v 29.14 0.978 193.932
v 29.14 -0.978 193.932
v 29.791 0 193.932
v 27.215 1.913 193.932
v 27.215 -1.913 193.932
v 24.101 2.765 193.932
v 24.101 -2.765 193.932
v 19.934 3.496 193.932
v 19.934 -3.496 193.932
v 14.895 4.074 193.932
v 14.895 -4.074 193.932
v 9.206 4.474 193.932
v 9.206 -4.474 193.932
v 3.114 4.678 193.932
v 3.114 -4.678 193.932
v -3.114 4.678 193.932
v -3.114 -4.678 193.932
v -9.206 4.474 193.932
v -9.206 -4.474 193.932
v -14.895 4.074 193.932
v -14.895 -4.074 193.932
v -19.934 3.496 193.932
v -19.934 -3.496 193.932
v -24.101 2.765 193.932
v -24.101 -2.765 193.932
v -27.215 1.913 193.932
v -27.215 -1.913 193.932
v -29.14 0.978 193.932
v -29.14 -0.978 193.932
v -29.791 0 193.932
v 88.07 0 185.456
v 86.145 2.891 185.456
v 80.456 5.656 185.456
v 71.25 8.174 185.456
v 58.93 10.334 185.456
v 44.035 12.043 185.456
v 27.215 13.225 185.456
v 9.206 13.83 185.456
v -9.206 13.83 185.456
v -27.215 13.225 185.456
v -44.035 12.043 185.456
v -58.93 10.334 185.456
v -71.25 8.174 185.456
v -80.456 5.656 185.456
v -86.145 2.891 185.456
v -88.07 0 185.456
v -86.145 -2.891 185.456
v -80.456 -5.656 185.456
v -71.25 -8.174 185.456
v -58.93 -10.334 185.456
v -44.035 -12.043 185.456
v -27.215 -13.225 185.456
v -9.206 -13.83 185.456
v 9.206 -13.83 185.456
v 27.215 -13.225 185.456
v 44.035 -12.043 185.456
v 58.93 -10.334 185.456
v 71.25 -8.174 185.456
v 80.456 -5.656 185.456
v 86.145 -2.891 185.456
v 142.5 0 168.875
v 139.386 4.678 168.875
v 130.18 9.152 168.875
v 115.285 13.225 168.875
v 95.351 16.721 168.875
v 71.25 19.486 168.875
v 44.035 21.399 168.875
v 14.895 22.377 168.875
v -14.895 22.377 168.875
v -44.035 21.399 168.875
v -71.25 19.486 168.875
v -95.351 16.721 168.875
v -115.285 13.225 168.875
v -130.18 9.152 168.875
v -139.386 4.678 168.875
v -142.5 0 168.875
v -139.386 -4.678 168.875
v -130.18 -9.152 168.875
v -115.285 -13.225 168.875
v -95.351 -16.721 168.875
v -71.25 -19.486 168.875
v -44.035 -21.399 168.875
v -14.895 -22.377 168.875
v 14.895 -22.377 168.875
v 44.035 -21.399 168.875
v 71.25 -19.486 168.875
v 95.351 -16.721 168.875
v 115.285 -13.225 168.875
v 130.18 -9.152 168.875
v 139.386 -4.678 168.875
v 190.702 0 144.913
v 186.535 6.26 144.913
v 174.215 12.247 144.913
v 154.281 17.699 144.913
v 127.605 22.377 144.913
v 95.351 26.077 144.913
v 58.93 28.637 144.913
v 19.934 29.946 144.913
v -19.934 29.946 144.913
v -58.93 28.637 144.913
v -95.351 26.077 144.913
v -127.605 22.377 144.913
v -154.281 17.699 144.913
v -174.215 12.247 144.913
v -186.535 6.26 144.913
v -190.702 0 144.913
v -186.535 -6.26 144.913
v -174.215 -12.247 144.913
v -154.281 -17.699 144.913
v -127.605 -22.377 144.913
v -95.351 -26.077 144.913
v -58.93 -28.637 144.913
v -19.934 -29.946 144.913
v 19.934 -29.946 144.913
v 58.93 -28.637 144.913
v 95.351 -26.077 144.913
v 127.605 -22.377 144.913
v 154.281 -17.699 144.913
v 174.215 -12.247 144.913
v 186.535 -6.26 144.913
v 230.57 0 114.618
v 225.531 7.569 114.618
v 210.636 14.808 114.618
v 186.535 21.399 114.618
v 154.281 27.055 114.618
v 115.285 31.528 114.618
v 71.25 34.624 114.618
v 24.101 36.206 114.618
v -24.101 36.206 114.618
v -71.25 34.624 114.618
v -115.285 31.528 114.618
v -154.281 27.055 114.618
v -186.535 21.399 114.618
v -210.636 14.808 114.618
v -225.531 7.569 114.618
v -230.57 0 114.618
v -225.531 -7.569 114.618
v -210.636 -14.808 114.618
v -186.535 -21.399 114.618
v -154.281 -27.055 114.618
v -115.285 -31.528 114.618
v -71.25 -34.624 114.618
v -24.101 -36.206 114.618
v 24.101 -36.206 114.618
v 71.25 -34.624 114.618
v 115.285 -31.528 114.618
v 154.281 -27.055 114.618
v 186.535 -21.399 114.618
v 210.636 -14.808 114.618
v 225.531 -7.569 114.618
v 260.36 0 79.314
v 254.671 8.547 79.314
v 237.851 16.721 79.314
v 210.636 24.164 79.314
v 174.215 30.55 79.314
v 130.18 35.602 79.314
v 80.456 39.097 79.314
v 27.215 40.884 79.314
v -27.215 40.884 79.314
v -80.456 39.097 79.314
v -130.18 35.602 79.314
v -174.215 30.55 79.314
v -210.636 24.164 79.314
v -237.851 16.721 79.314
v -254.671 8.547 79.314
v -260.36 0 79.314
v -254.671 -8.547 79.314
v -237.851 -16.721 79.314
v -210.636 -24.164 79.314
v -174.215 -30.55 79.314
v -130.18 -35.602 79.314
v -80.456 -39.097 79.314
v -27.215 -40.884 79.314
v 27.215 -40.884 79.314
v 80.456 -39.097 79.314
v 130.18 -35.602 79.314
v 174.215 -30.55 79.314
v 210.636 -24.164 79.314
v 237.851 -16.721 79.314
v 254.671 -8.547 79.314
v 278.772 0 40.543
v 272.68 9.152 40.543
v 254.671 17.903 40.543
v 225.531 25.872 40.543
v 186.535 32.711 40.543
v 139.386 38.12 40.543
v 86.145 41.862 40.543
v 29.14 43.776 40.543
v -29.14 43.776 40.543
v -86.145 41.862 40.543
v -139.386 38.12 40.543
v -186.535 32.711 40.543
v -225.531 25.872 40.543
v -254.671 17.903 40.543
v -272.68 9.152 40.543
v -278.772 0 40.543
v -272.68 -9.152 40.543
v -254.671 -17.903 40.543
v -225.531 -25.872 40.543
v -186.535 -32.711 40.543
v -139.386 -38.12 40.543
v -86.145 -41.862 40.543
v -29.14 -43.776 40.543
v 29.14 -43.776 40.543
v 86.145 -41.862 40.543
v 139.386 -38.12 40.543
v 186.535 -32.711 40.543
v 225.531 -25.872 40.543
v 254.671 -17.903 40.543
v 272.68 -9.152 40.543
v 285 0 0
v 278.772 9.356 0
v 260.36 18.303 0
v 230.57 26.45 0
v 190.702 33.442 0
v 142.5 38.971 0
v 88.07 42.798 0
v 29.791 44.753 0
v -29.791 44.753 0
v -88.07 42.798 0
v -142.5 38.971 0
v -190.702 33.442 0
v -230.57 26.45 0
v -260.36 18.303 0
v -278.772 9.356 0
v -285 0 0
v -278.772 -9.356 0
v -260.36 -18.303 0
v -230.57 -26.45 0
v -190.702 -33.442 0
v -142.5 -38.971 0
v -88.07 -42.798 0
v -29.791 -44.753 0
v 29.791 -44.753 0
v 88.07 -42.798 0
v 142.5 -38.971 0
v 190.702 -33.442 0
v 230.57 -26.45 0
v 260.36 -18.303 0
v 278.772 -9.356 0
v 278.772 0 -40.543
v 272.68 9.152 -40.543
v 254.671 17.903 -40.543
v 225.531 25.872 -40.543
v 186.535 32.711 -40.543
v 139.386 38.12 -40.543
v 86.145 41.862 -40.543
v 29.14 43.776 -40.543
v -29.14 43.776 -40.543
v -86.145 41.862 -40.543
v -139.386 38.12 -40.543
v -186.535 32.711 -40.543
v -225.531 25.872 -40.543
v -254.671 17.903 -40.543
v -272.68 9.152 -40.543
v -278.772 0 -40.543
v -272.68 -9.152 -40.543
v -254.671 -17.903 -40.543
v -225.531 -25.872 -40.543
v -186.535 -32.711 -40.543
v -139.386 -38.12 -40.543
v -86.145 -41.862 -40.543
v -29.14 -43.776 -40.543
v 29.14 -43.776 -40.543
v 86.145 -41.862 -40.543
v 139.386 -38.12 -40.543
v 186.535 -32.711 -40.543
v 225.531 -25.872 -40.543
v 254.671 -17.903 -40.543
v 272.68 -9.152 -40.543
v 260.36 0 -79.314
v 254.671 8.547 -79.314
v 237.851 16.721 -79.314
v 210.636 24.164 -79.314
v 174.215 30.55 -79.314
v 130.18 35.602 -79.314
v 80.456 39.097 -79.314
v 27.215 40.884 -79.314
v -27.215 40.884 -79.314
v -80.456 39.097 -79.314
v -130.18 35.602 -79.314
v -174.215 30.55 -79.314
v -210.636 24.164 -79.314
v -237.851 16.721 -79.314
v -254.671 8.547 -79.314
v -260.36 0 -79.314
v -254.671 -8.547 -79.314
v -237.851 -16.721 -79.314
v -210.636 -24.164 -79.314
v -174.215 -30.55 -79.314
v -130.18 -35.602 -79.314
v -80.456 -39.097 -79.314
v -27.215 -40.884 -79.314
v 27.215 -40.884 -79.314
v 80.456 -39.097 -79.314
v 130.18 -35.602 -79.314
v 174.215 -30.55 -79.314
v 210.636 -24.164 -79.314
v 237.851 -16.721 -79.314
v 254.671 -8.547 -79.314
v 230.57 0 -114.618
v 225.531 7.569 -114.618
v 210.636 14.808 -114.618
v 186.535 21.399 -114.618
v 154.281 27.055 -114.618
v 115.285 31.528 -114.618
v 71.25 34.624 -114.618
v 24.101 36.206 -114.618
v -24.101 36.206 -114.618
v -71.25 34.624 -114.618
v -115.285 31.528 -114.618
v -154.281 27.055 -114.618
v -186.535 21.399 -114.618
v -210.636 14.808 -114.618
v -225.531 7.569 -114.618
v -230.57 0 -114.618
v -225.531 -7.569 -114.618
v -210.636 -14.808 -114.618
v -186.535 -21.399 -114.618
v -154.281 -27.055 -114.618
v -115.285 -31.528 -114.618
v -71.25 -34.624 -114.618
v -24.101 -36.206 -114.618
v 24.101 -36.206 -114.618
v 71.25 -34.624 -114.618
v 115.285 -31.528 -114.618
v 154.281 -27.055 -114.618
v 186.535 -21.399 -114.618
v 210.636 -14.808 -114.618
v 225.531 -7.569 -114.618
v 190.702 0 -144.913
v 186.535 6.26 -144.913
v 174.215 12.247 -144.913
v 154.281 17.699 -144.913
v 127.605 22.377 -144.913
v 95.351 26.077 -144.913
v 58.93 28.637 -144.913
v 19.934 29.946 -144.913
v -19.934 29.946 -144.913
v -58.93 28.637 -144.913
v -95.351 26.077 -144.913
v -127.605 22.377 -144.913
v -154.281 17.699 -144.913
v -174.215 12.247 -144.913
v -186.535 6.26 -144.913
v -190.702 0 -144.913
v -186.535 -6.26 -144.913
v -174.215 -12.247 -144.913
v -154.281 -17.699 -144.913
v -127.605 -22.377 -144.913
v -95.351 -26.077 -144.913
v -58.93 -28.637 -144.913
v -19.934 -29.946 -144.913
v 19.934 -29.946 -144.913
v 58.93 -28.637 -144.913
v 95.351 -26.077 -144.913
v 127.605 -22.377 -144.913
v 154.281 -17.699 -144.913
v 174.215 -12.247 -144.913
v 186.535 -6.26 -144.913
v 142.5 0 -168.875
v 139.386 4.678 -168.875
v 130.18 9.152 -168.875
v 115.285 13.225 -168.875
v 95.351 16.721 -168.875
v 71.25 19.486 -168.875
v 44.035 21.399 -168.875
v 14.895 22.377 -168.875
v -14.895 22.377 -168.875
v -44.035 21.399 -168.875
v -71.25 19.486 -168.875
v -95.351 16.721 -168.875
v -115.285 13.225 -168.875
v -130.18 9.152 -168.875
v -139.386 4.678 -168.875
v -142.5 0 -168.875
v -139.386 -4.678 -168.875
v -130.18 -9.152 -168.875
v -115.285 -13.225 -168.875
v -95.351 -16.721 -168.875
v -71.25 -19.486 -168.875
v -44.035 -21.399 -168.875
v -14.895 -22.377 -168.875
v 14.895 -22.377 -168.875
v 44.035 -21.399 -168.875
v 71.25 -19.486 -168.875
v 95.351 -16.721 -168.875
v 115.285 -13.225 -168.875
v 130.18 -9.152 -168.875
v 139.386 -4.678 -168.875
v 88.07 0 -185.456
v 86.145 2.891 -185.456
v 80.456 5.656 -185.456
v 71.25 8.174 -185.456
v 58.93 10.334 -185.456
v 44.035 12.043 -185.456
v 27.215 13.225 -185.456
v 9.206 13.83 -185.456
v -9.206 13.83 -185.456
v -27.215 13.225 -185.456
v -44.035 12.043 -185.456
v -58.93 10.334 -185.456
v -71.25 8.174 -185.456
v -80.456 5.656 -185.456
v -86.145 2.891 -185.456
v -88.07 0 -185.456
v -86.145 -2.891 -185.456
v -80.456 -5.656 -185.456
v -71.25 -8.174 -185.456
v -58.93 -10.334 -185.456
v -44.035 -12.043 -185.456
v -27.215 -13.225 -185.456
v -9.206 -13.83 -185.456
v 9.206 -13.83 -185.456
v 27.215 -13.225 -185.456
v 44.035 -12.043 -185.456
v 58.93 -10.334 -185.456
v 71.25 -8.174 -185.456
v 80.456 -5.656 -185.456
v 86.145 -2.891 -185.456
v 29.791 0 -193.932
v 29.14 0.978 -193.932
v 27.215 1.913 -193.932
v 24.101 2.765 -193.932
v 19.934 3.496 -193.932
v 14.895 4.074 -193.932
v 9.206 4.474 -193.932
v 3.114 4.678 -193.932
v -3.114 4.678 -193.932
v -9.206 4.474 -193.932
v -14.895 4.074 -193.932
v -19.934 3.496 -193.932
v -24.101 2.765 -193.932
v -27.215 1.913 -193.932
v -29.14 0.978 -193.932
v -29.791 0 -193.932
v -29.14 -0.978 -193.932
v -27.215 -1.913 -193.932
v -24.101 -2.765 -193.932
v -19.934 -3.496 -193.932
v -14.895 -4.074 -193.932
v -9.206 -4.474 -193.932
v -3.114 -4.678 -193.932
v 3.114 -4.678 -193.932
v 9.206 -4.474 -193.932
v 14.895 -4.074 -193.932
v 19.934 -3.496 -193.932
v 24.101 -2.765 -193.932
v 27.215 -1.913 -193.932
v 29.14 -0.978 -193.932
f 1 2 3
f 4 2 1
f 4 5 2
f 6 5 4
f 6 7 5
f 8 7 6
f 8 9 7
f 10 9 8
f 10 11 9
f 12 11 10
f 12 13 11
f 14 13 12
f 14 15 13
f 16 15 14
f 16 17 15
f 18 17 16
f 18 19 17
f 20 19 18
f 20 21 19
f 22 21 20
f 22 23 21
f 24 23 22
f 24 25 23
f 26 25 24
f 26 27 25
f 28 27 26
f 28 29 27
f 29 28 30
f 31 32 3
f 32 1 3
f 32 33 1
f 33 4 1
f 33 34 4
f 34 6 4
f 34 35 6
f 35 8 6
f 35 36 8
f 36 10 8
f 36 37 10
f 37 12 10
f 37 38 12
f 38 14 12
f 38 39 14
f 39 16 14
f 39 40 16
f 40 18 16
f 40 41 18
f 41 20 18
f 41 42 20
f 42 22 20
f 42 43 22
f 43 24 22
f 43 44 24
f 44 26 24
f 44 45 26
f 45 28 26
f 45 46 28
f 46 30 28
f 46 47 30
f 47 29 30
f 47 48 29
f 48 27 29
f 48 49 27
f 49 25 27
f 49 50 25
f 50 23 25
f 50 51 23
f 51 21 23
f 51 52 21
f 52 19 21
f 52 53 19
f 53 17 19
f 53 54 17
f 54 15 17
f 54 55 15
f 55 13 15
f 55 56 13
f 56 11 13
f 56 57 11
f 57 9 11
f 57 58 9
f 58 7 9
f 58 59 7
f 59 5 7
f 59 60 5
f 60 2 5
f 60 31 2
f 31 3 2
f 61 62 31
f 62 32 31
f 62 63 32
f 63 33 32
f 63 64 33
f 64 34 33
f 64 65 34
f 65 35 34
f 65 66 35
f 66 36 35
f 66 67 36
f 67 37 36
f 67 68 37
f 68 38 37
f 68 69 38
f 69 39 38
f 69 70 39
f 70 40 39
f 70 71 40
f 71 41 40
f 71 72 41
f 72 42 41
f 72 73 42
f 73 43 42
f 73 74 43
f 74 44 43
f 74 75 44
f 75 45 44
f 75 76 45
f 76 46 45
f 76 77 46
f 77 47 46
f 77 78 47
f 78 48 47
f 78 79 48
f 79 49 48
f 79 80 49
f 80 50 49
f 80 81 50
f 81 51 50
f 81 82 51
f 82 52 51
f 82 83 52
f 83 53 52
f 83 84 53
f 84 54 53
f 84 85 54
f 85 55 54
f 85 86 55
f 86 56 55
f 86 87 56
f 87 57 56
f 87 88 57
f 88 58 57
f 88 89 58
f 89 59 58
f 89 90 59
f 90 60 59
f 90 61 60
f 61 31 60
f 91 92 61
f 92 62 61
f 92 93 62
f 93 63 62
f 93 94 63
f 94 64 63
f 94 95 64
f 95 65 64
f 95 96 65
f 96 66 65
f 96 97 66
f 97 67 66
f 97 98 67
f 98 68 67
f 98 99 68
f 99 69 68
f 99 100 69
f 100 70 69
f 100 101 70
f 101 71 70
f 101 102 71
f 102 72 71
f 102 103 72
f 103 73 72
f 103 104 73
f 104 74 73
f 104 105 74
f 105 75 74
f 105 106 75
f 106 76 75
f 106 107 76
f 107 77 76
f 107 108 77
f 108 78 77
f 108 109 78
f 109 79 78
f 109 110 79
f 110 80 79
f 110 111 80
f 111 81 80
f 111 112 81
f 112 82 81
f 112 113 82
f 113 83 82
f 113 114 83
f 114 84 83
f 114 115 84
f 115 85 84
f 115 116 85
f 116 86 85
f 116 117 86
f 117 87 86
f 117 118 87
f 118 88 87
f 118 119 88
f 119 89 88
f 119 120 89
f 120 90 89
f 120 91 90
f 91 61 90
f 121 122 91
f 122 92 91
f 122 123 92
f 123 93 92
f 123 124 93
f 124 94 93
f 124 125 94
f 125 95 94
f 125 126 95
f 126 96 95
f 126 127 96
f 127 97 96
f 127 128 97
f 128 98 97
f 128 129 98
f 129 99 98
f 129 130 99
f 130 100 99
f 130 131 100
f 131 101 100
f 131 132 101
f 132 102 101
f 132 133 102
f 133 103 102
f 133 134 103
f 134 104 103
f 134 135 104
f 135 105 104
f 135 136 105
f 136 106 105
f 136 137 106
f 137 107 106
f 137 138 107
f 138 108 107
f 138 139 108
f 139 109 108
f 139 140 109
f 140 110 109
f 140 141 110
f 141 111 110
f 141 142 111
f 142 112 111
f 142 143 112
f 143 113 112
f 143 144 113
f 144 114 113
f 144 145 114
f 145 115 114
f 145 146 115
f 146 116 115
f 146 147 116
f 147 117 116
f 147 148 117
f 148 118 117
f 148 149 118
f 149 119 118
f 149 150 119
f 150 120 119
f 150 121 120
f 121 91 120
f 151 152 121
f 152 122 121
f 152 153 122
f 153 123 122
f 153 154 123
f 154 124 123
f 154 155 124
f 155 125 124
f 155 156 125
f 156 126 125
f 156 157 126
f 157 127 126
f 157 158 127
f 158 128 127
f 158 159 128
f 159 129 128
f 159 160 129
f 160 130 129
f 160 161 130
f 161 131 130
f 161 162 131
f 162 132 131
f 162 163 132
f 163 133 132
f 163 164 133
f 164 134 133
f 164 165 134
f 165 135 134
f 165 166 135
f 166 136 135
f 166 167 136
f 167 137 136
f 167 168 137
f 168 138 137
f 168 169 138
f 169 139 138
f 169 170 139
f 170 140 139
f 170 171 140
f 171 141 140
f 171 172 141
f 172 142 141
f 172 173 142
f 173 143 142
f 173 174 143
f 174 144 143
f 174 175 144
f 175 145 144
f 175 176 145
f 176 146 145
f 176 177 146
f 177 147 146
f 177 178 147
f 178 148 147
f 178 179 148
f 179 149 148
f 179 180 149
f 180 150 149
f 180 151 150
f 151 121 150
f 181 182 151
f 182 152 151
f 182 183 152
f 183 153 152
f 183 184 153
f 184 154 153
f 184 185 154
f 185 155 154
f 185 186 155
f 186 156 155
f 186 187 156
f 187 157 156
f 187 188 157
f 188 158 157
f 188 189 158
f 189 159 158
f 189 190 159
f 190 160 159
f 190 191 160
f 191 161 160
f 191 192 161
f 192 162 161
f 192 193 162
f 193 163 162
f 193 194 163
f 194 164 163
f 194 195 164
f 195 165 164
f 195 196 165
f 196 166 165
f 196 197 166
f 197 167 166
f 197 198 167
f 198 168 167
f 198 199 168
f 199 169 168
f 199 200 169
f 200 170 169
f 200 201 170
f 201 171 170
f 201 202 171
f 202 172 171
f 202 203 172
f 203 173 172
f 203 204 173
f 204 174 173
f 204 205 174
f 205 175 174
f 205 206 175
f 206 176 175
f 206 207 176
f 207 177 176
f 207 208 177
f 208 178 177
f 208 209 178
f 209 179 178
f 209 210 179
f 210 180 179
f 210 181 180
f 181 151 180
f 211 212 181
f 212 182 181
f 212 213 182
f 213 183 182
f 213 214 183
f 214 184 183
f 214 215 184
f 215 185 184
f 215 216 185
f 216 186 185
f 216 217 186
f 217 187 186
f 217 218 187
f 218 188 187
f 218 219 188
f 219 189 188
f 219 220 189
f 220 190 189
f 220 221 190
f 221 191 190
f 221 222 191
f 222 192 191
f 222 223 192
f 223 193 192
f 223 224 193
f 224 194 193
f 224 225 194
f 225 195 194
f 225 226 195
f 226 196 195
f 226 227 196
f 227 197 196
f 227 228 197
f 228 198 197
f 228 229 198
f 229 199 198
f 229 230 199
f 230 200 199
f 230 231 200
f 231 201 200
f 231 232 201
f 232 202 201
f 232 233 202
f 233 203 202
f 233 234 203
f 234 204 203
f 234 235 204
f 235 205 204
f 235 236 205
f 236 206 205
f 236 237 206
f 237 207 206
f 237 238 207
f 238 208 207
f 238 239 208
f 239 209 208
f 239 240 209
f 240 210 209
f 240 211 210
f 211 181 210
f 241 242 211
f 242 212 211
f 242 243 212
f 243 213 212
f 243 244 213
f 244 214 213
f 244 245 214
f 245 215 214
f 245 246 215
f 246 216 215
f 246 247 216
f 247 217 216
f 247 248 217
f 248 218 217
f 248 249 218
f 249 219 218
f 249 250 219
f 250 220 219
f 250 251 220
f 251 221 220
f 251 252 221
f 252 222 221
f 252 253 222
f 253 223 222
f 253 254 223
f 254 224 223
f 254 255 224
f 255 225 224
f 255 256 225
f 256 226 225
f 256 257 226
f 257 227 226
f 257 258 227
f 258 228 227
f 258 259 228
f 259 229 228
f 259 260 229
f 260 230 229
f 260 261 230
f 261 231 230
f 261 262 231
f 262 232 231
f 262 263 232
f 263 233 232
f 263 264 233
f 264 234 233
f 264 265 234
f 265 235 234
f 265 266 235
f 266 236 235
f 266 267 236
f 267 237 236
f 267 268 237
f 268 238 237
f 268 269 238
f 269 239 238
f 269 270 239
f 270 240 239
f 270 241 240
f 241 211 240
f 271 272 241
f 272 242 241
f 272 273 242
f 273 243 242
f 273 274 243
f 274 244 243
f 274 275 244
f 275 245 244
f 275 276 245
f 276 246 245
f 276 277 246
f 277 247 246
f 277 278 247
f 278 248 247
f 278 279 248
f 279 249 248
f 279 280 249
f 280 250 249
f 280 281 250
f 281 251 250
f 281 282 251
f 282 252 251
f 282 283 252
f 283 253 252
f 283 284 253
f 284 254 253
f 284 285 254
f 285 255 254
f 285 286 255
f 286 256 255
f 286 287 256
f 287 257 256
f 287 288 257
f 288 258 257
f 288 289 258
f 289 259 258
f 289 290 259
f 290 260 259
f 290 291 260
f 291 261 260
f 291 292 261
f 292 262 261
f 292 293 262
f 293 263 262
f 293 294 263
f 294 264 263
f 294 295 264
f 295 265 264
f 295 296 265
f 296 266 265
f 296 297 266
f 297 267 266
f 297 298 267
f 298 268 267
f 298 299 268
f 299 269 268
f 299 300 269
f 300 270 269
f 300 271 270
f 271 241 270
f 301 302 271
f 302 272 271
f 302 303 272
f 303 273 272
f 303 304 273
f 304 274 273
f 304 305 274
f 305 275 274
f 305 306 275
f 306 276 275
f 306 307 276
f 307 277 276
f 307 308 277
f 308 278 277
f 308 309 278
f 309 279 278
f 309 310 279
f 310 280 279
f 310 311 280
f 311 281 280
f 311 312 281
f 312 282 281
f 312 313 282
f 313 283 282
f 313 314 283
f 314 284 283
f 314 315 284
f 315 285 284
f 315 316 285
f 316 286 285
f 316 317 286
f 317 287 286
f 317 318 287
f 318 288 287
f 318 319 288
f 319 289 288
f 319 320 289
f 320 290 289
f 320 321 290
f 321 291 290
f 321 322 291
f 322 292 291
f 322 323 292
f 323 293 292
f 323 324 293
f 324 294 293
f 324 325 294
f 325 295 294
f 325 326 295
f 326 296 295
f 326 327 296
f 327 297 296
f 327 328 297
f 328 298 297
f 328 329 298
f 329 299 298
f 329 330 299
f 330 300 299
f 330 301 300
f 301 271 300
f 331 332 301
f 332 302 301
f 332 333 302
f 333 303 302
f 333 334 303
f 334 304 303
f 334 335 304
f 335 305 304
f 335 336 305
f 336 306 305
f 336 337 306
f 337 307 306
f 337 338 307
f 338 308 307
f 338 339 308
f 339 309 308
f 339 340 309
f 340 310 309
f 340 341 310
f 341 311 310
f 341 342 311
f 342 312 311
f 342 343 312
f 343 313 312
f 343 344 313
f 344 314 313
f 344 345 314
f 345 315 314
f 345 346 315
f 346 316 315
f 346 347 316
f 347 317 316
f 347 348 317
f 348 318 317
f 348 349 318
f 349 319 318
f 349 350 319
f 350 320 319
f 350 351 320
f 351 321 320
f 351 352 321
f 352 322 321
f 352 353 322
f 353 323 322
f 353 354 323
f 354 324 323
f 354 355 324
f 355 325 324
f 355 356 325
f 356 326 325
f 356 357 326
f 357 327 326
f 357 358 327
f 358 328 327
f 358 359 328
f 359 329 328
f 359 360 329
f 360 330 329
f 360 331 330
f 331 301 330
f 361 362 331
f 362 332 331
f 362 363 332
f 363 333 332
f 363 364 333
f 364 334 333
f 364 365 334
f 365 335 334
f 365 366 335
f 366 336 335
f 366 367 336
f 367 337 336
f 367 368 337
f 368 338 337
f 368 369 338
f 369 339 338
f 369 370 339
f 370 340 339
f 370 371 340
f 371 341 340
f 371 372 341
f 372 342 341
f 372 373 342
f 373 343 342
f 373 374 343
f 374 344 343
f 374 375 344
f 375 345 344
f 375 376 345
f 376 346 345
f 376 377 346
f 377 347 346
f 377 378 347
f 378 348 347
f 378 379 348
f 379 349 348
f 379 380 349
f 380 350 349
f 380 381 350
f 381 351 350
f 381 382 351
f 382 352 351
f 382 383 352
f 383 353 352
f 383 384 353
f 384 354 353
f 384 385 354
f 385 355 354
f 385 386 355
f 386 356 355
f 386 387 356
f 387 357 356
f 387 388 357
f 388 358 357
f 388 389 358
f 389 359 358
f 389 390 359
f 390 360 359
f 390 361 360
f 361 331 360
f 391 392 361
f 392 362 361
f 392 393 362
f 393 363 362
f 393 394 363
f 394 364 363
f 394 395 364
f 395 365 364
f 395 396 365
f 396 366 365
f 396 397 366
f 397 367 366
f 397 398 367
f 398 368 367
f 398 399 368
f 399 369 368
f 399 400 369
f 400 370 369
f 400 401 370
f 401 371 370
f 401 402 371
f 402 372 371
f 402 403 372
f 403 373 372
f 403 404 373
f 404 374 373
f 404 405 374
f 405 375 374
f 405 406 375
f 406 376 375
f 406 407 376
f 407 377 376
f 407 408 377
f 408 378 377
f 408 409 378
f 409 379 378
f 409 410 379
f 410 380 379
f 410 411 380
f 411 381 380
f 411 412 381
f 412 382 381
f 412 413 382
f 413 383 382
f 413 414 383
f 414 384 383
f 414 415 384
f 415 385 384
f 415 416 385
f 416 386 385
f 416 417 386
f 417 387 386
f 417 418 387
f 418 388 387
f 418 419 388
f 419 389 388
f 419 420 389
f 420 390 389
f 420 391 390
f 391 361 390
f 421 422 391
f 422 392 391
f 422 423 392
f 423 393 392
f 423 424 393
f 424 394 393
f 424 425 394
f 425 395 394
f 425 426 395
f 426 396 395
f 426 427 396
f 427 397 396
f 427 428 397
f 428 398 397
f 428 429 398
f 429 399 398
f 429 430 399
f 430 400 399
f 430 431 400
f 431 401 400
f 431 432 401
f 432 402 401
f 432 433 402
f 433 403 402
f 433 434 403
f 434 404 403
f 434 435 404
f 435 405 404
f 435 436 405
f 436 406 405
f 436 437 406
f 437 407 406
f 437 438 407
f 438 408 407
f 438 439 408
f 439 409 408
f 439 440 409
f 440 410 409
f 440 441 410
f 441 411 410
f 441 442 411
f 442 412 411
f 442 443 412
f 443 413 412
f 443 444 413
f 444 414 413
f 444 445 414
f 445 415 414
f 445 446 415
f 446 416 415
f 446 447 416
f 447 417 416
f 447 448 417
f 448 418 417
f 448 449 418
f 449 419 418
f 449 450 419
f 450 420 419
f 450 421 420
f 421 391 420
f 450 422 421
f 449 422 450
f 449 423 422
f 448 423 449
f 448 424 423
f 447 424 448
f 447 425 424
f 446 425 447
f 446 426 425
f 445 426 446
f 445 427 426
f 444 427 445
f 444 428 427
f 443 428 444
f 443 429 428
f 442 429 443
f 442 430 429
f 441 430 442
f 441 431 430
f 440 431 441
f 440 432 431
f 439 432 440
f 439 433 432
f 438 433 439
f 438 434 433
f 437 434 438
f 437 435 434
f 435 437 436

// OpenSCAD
// Generated by SolidPython 1.0.1 on 2020-07-29 00:46:53


scale(v = [19, 3, 13]) {
	sphere(r = 15);
}
/***********************************************
*********      SolidPython code:      **********
************************************************
 
# import packages: SolidPython
from solid import *
from solid.utils import *
from itertools import chain, combinations, permutations


class Resize:

    def __init__(self, scad_file):
        self.scad_file = scad_file
        #self.scad_file = import_scad(scad_file)
        # cone/cylinder param:
        self.r1 = 0
        self.r2 = 0
        self.h = 0
        # rectangular prism param:
        self.w = 0
        self.l = 0
        # ellipse param:
        self.r = 0

    # import OpenScad code (file name corresponds to shape)


    # classify shape + parameters
    def assign(self, param1, param2, param3):
        if self.scad_file == 'cone.scad':
            self.r1 = param1
            self.r2 = param2
            self.h = param3
        elif self.scad_file == 'cylinder.scad':
            self.r1 = param1
            self.r2 = param2
            self.h = param3
        elif self.scad_file == 'rectangularPrism.scad':
            self.h = param1
            self.l = param2
            self.w = param3
        else:
            self.r = param1
            self.h = param2

    # resize parameters
    def iterate(self):
        x = range(3, 20, 2)
        i = 1
        if self.scad_file == 'cone.scad':
            tempList = list(permutations(x, 2))
            for temp in tempList:
                param1 = temp[0]
                param2 = temp[1]
                filepath = 'produced_scad_files/' + 'cone' + str(param1) + '_' + str(param2) + '_' + '.scad'
                scad_render_to_file(cylinder(h=param1, r1=param2, r2=0), filepath)

        elif self.scad_file == 'cylinder.scad':
            tempList = list(permutations(x, 3))
            for temp in tempList:
                param1 = temp[0]
                param2 = temp[1]
                filepath = 'produced_scad_files/' + 'cylinder' + str(param1) + '_' + str(param2) + '_' + '.scad'
                scad_render_to_file(cylinder(h=param1, r1=param2, r2=param2), filepath)

        elif self.scad_file == 'rectangularPrism.scad':
            tempList = list(permutations(x, 3))
            for temp in tempList:
                param1 = temp[0]
                param2 = temp[1]
                param3 = temp[2]
                filepath = 'produced_scad_files/' + 'rectangularPrism' + str(param1) + '_' + str(param2) + '_' + str(
                    param3) + '.scad'
                scad_render_to_file(cube(size=(param1, param2, param3)), filepath)

        elif self.scad_file == 'ellipse.scad':
            tempList = list(permutations(x, 4))
            for temp in tempList:
                param1 = temp[0]
                param2 = temp[1]
                param3 = temp[2]
                param4 = temp[3]
                filepath = 'produced_scad_files/' + 'ellipse' + str(param1) + '_' + str(param2) + '_' + str(param3) + '_' + str(param4) + '.scad'
                scad_render_to_file(scale([param1, param2, param3])(sphere(r=param4)), filepath)

    def render_to_scadfile(self):
        scad_render_to_file(scad, 'example.scad') 
 
************************************************/
